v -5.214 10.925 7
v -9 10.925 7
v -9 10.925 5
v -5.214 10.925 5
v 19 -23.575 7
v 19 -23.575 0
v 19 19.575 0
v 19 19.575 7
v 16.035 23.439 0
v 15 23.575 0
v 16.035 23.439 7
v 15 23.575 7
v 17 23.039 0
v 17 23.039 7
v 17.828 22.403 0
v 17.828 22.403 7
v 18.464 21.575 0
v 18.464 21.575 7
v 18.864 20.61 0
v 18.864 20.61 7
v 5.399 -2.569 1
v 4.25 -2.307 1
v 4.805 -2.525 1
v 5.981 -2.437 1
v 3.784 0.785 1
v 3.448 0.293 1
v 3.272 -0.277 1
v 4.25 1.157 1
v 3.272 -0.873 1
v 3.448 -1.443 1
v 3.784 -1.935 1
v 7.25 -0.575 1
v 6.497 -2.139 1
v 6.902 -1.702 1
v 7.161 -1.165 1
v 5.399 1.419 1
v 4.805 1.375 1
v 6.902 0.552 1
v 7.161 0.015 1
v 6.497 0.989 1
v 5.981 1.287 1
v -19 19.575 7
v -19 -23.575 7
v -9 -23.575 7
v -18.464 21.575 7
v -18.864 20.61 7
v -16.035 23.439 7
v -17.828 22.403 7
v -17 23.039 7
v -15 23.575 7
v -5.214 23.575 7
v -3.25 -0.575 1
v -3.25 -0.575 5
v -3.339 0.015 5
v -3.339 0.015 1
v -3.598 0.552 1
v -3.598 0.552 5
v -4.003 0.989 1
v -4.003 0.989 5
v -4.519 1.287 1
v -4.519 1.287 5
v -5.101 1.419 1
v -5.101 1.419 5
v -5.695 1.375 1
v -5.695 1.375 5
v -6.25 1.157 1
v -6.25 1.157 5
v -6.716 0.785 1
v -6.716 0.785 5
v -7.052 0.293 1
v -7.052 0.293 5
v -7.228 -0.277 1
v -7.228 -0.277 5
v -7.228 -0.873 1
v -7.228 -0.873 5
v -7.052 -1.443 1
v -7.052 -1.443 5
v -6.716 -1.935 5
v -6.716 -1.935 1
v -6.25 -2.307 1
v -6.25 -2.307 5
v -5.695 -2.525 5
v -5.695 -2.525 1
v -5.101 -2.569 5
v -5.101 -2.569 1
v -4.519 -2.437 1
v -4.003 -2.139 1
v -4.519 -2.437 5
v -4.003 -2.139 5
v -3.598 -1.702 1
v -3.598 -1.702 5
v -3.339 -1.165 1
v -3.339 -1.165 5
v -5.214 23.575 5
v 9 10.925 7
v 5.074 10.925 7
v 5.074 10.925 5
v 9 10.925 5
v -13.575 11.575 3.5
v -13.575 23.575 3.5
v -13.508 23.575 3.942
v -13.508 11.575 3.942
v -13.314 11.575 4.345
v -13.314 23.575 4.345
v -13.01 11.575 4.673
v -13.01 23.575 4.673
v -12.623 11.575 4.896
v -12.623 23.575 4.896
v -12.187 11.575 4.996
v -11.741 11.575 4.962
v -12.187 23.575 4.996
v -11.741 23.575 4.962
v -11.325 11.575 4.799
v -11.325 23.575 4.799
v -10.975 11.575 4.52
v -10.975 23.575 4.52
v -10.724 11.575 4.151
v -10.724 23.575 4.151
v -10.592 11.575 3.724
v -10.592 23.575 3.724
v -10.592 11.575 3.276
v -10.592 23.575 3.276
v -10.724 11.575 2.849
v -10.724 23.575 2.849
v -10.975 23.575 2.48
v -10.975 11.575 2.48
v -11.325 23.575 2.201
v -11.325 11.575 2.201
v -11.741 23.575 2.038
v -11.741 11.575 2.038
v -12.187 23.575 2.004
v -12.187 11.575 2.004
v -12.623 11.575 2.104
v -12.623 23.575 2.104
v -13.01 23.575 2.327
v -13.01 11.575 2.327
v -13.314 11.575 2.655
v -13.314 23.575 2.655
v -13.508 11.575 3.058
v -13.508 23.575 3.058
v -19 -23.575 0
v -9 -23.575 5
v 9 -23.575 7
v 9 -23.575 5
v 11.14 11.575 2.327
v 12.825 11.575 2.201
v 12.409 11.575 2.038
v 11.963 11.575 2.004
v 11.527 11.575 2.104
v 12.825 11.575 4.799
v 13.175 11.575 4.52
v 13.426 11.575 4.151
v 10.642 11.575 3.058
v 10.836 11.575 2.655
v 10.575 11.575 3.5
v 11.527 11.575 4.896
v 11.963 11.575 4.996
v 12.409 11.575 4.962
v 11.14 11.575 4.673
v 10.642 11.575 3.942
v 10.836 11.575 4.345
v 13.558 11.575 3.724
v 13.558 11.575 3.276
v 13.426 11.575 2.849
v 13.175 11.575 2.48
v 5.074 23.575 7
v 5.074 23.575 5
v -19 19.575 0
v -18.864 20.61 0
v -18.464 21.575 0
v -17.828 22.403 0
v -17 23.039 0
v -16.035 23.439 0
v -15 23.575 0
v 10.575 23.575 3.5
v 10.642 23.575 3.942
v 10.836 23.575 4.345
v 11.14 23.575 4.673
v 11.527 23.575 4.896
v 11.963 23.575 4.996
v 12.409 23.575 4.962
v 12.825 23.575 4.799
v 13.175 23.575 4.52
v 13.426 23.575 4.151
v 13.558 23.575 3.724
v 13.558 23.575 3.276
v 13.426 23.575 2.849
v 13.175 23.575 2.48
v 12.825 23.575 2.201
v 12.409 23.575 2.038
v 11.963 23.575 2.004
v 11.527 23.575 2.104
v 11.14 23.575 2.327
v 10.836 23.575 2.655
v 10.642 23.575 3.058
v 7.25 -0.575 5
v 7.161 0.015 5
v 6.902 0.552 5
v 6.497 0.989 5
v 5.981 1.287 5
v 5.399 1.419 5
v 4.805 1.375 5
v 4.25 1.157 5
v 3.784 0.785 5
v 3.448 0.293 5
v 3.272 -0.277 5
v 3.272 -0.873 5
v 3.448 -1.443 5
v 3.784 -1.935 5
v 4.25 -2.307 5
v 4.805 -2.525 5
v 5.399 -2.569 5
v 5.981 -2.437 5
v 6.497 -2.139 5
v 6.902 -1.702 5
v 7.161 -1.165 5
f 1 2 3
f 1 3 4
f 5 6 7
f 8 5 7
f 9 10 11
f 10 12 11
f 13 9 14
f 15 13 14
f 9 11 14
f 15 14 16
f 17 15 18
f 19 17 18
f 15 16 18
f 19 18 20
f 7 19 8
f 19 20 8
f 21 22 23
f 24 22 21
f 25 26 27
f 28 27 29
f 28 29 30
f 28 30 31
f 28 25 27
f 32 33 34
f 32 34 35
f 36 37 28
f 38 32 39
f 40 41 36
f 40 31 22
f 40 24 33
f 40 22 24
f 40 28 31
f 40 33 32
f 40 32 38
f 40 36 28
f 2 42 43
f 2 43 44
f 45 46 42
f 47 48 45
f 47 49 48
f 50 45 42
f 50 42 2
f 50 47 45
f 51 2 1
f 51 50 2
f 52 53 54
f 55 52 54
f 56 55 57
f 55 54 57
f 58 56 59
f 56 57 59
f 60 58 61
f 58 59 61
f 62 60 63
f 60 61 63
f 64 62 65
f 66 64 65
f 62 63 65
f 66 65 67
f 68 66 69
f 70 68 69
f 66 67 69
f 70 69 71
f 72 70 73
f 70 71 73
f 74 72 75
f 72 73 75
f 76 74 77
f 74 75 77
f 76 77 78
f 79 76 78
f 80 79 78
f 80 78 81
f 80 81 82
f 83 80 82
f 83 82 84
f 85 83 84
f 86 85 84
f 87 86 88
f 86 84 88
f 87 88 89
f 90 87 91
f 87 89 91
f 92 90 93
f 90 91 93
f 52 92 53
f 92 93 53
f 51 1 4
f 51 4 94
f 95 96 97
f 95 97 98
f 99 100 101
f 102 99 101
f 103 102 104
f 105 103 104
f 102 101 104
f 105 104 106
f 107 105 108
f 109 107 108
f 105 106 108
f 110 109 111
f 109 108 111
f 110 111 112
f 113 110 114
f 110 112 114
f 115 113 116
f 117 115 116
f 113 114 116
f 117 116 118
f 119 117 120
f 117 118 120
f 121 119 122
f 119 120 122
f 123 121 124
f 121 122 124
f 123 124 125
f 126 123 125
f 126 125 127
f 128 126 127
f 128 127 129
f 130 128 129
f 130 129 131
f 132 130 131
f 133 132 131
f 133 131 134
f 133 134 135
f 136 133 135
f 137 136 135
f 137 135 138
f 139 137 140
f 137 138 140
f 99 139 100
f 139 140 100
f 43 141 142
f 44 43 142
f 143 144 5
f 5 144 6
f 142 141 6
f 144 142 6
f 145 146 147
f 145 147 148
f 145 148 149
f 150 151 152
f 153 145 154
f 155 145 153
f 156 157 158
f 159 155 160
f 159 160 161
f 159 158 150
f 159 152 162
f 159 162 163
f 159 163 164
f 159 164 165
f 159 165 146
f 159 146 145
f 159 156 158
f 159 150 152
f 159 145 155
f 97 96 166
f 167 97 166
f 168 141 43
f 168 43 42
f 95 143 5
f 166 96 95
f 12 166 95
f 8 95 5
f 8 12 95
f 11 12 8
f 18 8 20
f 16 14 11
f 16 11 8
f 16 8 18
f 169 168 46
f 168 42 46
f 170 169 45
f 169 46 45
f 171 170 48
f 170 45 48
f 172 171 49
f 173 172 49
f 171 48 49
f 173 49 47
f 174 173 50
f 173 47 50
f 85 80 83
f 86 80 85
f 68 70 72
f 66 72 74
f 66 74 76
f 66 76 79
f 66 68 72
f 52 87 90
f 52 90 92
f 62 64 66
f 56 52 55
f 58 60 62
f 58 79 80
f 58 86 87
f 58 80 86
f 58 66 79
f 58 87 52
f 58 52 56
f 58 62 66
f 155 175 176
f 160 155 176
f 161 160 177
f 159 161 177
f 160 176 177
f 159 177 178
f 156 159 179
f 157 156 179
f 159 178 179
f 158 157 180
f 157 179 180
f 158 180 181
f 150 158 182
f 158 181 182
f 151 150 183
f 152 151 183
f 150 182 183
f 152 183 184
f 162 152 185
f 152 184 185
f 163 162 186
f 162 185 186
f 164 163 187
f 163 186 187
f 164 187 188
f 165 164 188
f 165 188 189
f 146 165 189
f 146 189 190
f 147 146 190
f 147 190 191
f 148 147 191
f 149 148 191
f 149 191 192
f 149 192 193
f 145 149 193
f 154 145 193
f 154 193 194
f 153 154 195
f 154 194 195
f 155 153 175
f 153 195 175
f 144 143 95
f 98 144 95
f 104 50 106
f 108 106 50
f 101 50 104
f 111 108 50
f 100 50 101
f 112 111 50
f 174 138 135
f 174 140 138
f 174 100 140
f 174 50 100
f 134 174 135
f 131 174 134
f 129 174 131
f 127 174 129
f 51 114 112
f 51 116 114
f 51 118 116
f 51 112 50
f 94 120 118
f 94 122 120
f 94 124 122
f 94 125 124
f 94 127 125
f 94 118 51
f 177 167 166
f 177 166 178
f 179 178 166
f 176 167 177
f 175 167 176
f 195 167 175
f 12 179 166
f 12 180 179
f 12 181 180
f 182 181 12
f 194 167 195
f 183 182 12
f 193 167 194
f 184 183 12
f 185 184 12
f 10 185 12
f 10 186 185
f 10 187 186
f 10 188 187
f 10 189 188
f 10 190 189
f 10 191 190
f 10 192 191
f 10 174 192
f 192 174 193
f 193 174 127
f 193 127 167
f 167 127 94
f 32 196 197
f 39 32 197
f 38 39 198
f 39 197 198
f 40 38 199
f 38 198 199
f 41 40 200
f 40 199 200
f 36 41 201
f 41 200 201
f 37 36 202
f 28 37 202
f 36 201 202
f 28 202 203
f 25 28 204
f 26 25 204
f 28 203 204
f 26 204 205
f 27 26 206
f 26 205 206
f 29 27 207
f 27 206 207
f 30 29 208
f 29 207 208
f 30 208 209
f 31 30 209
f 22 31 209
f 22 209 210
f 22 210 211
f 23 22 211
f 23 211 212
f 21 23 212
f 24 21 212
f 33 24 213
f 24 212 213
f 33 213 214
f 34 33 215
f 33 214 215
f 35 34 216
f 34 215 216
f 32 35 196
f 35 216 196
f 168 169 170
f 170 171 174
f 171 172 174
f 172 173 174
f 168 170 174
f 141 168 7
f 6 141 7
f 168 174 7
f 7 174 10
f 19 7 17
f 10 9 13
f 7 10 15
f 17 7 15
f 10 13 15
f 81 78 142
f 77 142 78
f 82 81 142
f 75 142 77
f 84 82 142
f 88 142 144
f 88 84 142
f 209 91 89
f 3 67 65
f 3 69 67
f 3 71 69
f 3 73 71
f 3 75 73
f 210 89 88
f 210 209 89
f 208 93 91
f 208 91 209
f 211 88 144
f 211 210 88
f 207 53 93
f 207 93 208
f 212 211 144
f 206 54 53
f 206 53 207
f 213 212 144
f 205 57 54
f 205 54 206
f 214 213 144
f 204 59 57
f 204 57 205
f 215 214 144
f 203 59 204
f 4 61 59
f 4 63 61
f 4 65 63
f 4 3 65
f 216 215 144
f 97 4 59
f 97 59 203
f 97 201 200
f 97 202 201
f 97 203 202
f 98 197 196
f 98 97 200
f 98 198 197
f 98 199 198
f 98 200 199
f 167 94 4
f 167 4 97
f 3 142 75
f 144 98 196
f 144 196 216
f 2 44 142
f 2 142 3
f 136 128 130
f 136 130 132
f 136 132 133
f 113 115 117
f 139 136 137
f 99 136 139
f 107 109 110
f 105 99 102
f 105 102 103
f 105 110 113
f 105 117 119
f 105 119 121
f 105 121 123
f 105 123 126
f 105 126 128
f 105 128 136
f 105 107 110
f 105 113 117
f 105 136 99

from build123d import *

# Parameters (mm, degrees)
SKETCH_W        = 38
SKETCH_H        = 47.15
PAD_DEPTH       = 7
SKETCH001_R     = 1.5
POCKET_DEPTH    = 12
FILLET_R        = 4
SKETCH002_W     = 18
SKETCH002_H     = 34.5
POCKET001_DEPTH = 2
SKETCH003_W     = 10.28814
SKETCH003_H     = 13.233085
POCKET002_DEPTH = 2
SKETCH004_R     = 2
POCKET003_DEPTH = 4


with BuildPart() as part:
    # Sketch → Pad (new body)
    with BuildSketch(Plane.XY):
        Rectangle(SKETCH_W, SKETCH_H)
    extrude(amount=PAD_DEPTH)

    # Sketch001 (on Face4 of Pad) → Pocket (cut)
    with BuildSketch(Plane(origin=(0, 23.575, 0), x_dir=(-1, 0, 0), z_dir=(0, 1, 0))):
        with Locations((-12.075, 3.5)):
            Circle(SKETCH001_R)
        with Locations((12.075, 3.5)):
            Circle(SKETCH001_R)
    extrude(amount=-POCKET_DEPTH, mode=Mode.SUBTRACT)

    # Fillet
    fillet_edges = [part.edges().sort_by_distance(p)[0] for p in [
        (-19, 23.575, 3.5),
        (19, 23.575, 3.5),
    ]]
    fillet(fillet_edges, radius=FILLET_R)

    # Sketch002 (on Face5 of Fillet) → Pocket001 (cut)
    with BuildSketch(Plane.XY.offset(7)):
        with Locations((0, -6.325)):
            Rectangle(SKETCH002_W, SKETCH002_H)
    extrude(amount=-POCKET001_DEPTH, mode=Mode.SUBTRACT)

    # Sketch003 (on Face5 of Pocket001) → Pocket002 (cut)
    with BuildSketch(Plane.XY.offset(7)):
        with Locations((-0.070341, 16.958458)):
            Rectangle(SKETCH003_W, SKETCH003_H)
    extrude(amount=-POCKET002_DEPTH, mode=Mode.SUBTRACT)

    # Sketch004 (on Face20 of Pocket002) → Pocket003 (cut)
    with BuildSketch(Plane.XY.offset(5)):
        with Locations((-5.25, -0.575)):
            Circle(SKETCH004_R)
        with Locations((5.25, -0.575)):
            Circle(SKETCH004_R)
    extrude(amount=-POCKET003_DEPTH, mode=Mode.SUBTRACT)


solid = part.part
